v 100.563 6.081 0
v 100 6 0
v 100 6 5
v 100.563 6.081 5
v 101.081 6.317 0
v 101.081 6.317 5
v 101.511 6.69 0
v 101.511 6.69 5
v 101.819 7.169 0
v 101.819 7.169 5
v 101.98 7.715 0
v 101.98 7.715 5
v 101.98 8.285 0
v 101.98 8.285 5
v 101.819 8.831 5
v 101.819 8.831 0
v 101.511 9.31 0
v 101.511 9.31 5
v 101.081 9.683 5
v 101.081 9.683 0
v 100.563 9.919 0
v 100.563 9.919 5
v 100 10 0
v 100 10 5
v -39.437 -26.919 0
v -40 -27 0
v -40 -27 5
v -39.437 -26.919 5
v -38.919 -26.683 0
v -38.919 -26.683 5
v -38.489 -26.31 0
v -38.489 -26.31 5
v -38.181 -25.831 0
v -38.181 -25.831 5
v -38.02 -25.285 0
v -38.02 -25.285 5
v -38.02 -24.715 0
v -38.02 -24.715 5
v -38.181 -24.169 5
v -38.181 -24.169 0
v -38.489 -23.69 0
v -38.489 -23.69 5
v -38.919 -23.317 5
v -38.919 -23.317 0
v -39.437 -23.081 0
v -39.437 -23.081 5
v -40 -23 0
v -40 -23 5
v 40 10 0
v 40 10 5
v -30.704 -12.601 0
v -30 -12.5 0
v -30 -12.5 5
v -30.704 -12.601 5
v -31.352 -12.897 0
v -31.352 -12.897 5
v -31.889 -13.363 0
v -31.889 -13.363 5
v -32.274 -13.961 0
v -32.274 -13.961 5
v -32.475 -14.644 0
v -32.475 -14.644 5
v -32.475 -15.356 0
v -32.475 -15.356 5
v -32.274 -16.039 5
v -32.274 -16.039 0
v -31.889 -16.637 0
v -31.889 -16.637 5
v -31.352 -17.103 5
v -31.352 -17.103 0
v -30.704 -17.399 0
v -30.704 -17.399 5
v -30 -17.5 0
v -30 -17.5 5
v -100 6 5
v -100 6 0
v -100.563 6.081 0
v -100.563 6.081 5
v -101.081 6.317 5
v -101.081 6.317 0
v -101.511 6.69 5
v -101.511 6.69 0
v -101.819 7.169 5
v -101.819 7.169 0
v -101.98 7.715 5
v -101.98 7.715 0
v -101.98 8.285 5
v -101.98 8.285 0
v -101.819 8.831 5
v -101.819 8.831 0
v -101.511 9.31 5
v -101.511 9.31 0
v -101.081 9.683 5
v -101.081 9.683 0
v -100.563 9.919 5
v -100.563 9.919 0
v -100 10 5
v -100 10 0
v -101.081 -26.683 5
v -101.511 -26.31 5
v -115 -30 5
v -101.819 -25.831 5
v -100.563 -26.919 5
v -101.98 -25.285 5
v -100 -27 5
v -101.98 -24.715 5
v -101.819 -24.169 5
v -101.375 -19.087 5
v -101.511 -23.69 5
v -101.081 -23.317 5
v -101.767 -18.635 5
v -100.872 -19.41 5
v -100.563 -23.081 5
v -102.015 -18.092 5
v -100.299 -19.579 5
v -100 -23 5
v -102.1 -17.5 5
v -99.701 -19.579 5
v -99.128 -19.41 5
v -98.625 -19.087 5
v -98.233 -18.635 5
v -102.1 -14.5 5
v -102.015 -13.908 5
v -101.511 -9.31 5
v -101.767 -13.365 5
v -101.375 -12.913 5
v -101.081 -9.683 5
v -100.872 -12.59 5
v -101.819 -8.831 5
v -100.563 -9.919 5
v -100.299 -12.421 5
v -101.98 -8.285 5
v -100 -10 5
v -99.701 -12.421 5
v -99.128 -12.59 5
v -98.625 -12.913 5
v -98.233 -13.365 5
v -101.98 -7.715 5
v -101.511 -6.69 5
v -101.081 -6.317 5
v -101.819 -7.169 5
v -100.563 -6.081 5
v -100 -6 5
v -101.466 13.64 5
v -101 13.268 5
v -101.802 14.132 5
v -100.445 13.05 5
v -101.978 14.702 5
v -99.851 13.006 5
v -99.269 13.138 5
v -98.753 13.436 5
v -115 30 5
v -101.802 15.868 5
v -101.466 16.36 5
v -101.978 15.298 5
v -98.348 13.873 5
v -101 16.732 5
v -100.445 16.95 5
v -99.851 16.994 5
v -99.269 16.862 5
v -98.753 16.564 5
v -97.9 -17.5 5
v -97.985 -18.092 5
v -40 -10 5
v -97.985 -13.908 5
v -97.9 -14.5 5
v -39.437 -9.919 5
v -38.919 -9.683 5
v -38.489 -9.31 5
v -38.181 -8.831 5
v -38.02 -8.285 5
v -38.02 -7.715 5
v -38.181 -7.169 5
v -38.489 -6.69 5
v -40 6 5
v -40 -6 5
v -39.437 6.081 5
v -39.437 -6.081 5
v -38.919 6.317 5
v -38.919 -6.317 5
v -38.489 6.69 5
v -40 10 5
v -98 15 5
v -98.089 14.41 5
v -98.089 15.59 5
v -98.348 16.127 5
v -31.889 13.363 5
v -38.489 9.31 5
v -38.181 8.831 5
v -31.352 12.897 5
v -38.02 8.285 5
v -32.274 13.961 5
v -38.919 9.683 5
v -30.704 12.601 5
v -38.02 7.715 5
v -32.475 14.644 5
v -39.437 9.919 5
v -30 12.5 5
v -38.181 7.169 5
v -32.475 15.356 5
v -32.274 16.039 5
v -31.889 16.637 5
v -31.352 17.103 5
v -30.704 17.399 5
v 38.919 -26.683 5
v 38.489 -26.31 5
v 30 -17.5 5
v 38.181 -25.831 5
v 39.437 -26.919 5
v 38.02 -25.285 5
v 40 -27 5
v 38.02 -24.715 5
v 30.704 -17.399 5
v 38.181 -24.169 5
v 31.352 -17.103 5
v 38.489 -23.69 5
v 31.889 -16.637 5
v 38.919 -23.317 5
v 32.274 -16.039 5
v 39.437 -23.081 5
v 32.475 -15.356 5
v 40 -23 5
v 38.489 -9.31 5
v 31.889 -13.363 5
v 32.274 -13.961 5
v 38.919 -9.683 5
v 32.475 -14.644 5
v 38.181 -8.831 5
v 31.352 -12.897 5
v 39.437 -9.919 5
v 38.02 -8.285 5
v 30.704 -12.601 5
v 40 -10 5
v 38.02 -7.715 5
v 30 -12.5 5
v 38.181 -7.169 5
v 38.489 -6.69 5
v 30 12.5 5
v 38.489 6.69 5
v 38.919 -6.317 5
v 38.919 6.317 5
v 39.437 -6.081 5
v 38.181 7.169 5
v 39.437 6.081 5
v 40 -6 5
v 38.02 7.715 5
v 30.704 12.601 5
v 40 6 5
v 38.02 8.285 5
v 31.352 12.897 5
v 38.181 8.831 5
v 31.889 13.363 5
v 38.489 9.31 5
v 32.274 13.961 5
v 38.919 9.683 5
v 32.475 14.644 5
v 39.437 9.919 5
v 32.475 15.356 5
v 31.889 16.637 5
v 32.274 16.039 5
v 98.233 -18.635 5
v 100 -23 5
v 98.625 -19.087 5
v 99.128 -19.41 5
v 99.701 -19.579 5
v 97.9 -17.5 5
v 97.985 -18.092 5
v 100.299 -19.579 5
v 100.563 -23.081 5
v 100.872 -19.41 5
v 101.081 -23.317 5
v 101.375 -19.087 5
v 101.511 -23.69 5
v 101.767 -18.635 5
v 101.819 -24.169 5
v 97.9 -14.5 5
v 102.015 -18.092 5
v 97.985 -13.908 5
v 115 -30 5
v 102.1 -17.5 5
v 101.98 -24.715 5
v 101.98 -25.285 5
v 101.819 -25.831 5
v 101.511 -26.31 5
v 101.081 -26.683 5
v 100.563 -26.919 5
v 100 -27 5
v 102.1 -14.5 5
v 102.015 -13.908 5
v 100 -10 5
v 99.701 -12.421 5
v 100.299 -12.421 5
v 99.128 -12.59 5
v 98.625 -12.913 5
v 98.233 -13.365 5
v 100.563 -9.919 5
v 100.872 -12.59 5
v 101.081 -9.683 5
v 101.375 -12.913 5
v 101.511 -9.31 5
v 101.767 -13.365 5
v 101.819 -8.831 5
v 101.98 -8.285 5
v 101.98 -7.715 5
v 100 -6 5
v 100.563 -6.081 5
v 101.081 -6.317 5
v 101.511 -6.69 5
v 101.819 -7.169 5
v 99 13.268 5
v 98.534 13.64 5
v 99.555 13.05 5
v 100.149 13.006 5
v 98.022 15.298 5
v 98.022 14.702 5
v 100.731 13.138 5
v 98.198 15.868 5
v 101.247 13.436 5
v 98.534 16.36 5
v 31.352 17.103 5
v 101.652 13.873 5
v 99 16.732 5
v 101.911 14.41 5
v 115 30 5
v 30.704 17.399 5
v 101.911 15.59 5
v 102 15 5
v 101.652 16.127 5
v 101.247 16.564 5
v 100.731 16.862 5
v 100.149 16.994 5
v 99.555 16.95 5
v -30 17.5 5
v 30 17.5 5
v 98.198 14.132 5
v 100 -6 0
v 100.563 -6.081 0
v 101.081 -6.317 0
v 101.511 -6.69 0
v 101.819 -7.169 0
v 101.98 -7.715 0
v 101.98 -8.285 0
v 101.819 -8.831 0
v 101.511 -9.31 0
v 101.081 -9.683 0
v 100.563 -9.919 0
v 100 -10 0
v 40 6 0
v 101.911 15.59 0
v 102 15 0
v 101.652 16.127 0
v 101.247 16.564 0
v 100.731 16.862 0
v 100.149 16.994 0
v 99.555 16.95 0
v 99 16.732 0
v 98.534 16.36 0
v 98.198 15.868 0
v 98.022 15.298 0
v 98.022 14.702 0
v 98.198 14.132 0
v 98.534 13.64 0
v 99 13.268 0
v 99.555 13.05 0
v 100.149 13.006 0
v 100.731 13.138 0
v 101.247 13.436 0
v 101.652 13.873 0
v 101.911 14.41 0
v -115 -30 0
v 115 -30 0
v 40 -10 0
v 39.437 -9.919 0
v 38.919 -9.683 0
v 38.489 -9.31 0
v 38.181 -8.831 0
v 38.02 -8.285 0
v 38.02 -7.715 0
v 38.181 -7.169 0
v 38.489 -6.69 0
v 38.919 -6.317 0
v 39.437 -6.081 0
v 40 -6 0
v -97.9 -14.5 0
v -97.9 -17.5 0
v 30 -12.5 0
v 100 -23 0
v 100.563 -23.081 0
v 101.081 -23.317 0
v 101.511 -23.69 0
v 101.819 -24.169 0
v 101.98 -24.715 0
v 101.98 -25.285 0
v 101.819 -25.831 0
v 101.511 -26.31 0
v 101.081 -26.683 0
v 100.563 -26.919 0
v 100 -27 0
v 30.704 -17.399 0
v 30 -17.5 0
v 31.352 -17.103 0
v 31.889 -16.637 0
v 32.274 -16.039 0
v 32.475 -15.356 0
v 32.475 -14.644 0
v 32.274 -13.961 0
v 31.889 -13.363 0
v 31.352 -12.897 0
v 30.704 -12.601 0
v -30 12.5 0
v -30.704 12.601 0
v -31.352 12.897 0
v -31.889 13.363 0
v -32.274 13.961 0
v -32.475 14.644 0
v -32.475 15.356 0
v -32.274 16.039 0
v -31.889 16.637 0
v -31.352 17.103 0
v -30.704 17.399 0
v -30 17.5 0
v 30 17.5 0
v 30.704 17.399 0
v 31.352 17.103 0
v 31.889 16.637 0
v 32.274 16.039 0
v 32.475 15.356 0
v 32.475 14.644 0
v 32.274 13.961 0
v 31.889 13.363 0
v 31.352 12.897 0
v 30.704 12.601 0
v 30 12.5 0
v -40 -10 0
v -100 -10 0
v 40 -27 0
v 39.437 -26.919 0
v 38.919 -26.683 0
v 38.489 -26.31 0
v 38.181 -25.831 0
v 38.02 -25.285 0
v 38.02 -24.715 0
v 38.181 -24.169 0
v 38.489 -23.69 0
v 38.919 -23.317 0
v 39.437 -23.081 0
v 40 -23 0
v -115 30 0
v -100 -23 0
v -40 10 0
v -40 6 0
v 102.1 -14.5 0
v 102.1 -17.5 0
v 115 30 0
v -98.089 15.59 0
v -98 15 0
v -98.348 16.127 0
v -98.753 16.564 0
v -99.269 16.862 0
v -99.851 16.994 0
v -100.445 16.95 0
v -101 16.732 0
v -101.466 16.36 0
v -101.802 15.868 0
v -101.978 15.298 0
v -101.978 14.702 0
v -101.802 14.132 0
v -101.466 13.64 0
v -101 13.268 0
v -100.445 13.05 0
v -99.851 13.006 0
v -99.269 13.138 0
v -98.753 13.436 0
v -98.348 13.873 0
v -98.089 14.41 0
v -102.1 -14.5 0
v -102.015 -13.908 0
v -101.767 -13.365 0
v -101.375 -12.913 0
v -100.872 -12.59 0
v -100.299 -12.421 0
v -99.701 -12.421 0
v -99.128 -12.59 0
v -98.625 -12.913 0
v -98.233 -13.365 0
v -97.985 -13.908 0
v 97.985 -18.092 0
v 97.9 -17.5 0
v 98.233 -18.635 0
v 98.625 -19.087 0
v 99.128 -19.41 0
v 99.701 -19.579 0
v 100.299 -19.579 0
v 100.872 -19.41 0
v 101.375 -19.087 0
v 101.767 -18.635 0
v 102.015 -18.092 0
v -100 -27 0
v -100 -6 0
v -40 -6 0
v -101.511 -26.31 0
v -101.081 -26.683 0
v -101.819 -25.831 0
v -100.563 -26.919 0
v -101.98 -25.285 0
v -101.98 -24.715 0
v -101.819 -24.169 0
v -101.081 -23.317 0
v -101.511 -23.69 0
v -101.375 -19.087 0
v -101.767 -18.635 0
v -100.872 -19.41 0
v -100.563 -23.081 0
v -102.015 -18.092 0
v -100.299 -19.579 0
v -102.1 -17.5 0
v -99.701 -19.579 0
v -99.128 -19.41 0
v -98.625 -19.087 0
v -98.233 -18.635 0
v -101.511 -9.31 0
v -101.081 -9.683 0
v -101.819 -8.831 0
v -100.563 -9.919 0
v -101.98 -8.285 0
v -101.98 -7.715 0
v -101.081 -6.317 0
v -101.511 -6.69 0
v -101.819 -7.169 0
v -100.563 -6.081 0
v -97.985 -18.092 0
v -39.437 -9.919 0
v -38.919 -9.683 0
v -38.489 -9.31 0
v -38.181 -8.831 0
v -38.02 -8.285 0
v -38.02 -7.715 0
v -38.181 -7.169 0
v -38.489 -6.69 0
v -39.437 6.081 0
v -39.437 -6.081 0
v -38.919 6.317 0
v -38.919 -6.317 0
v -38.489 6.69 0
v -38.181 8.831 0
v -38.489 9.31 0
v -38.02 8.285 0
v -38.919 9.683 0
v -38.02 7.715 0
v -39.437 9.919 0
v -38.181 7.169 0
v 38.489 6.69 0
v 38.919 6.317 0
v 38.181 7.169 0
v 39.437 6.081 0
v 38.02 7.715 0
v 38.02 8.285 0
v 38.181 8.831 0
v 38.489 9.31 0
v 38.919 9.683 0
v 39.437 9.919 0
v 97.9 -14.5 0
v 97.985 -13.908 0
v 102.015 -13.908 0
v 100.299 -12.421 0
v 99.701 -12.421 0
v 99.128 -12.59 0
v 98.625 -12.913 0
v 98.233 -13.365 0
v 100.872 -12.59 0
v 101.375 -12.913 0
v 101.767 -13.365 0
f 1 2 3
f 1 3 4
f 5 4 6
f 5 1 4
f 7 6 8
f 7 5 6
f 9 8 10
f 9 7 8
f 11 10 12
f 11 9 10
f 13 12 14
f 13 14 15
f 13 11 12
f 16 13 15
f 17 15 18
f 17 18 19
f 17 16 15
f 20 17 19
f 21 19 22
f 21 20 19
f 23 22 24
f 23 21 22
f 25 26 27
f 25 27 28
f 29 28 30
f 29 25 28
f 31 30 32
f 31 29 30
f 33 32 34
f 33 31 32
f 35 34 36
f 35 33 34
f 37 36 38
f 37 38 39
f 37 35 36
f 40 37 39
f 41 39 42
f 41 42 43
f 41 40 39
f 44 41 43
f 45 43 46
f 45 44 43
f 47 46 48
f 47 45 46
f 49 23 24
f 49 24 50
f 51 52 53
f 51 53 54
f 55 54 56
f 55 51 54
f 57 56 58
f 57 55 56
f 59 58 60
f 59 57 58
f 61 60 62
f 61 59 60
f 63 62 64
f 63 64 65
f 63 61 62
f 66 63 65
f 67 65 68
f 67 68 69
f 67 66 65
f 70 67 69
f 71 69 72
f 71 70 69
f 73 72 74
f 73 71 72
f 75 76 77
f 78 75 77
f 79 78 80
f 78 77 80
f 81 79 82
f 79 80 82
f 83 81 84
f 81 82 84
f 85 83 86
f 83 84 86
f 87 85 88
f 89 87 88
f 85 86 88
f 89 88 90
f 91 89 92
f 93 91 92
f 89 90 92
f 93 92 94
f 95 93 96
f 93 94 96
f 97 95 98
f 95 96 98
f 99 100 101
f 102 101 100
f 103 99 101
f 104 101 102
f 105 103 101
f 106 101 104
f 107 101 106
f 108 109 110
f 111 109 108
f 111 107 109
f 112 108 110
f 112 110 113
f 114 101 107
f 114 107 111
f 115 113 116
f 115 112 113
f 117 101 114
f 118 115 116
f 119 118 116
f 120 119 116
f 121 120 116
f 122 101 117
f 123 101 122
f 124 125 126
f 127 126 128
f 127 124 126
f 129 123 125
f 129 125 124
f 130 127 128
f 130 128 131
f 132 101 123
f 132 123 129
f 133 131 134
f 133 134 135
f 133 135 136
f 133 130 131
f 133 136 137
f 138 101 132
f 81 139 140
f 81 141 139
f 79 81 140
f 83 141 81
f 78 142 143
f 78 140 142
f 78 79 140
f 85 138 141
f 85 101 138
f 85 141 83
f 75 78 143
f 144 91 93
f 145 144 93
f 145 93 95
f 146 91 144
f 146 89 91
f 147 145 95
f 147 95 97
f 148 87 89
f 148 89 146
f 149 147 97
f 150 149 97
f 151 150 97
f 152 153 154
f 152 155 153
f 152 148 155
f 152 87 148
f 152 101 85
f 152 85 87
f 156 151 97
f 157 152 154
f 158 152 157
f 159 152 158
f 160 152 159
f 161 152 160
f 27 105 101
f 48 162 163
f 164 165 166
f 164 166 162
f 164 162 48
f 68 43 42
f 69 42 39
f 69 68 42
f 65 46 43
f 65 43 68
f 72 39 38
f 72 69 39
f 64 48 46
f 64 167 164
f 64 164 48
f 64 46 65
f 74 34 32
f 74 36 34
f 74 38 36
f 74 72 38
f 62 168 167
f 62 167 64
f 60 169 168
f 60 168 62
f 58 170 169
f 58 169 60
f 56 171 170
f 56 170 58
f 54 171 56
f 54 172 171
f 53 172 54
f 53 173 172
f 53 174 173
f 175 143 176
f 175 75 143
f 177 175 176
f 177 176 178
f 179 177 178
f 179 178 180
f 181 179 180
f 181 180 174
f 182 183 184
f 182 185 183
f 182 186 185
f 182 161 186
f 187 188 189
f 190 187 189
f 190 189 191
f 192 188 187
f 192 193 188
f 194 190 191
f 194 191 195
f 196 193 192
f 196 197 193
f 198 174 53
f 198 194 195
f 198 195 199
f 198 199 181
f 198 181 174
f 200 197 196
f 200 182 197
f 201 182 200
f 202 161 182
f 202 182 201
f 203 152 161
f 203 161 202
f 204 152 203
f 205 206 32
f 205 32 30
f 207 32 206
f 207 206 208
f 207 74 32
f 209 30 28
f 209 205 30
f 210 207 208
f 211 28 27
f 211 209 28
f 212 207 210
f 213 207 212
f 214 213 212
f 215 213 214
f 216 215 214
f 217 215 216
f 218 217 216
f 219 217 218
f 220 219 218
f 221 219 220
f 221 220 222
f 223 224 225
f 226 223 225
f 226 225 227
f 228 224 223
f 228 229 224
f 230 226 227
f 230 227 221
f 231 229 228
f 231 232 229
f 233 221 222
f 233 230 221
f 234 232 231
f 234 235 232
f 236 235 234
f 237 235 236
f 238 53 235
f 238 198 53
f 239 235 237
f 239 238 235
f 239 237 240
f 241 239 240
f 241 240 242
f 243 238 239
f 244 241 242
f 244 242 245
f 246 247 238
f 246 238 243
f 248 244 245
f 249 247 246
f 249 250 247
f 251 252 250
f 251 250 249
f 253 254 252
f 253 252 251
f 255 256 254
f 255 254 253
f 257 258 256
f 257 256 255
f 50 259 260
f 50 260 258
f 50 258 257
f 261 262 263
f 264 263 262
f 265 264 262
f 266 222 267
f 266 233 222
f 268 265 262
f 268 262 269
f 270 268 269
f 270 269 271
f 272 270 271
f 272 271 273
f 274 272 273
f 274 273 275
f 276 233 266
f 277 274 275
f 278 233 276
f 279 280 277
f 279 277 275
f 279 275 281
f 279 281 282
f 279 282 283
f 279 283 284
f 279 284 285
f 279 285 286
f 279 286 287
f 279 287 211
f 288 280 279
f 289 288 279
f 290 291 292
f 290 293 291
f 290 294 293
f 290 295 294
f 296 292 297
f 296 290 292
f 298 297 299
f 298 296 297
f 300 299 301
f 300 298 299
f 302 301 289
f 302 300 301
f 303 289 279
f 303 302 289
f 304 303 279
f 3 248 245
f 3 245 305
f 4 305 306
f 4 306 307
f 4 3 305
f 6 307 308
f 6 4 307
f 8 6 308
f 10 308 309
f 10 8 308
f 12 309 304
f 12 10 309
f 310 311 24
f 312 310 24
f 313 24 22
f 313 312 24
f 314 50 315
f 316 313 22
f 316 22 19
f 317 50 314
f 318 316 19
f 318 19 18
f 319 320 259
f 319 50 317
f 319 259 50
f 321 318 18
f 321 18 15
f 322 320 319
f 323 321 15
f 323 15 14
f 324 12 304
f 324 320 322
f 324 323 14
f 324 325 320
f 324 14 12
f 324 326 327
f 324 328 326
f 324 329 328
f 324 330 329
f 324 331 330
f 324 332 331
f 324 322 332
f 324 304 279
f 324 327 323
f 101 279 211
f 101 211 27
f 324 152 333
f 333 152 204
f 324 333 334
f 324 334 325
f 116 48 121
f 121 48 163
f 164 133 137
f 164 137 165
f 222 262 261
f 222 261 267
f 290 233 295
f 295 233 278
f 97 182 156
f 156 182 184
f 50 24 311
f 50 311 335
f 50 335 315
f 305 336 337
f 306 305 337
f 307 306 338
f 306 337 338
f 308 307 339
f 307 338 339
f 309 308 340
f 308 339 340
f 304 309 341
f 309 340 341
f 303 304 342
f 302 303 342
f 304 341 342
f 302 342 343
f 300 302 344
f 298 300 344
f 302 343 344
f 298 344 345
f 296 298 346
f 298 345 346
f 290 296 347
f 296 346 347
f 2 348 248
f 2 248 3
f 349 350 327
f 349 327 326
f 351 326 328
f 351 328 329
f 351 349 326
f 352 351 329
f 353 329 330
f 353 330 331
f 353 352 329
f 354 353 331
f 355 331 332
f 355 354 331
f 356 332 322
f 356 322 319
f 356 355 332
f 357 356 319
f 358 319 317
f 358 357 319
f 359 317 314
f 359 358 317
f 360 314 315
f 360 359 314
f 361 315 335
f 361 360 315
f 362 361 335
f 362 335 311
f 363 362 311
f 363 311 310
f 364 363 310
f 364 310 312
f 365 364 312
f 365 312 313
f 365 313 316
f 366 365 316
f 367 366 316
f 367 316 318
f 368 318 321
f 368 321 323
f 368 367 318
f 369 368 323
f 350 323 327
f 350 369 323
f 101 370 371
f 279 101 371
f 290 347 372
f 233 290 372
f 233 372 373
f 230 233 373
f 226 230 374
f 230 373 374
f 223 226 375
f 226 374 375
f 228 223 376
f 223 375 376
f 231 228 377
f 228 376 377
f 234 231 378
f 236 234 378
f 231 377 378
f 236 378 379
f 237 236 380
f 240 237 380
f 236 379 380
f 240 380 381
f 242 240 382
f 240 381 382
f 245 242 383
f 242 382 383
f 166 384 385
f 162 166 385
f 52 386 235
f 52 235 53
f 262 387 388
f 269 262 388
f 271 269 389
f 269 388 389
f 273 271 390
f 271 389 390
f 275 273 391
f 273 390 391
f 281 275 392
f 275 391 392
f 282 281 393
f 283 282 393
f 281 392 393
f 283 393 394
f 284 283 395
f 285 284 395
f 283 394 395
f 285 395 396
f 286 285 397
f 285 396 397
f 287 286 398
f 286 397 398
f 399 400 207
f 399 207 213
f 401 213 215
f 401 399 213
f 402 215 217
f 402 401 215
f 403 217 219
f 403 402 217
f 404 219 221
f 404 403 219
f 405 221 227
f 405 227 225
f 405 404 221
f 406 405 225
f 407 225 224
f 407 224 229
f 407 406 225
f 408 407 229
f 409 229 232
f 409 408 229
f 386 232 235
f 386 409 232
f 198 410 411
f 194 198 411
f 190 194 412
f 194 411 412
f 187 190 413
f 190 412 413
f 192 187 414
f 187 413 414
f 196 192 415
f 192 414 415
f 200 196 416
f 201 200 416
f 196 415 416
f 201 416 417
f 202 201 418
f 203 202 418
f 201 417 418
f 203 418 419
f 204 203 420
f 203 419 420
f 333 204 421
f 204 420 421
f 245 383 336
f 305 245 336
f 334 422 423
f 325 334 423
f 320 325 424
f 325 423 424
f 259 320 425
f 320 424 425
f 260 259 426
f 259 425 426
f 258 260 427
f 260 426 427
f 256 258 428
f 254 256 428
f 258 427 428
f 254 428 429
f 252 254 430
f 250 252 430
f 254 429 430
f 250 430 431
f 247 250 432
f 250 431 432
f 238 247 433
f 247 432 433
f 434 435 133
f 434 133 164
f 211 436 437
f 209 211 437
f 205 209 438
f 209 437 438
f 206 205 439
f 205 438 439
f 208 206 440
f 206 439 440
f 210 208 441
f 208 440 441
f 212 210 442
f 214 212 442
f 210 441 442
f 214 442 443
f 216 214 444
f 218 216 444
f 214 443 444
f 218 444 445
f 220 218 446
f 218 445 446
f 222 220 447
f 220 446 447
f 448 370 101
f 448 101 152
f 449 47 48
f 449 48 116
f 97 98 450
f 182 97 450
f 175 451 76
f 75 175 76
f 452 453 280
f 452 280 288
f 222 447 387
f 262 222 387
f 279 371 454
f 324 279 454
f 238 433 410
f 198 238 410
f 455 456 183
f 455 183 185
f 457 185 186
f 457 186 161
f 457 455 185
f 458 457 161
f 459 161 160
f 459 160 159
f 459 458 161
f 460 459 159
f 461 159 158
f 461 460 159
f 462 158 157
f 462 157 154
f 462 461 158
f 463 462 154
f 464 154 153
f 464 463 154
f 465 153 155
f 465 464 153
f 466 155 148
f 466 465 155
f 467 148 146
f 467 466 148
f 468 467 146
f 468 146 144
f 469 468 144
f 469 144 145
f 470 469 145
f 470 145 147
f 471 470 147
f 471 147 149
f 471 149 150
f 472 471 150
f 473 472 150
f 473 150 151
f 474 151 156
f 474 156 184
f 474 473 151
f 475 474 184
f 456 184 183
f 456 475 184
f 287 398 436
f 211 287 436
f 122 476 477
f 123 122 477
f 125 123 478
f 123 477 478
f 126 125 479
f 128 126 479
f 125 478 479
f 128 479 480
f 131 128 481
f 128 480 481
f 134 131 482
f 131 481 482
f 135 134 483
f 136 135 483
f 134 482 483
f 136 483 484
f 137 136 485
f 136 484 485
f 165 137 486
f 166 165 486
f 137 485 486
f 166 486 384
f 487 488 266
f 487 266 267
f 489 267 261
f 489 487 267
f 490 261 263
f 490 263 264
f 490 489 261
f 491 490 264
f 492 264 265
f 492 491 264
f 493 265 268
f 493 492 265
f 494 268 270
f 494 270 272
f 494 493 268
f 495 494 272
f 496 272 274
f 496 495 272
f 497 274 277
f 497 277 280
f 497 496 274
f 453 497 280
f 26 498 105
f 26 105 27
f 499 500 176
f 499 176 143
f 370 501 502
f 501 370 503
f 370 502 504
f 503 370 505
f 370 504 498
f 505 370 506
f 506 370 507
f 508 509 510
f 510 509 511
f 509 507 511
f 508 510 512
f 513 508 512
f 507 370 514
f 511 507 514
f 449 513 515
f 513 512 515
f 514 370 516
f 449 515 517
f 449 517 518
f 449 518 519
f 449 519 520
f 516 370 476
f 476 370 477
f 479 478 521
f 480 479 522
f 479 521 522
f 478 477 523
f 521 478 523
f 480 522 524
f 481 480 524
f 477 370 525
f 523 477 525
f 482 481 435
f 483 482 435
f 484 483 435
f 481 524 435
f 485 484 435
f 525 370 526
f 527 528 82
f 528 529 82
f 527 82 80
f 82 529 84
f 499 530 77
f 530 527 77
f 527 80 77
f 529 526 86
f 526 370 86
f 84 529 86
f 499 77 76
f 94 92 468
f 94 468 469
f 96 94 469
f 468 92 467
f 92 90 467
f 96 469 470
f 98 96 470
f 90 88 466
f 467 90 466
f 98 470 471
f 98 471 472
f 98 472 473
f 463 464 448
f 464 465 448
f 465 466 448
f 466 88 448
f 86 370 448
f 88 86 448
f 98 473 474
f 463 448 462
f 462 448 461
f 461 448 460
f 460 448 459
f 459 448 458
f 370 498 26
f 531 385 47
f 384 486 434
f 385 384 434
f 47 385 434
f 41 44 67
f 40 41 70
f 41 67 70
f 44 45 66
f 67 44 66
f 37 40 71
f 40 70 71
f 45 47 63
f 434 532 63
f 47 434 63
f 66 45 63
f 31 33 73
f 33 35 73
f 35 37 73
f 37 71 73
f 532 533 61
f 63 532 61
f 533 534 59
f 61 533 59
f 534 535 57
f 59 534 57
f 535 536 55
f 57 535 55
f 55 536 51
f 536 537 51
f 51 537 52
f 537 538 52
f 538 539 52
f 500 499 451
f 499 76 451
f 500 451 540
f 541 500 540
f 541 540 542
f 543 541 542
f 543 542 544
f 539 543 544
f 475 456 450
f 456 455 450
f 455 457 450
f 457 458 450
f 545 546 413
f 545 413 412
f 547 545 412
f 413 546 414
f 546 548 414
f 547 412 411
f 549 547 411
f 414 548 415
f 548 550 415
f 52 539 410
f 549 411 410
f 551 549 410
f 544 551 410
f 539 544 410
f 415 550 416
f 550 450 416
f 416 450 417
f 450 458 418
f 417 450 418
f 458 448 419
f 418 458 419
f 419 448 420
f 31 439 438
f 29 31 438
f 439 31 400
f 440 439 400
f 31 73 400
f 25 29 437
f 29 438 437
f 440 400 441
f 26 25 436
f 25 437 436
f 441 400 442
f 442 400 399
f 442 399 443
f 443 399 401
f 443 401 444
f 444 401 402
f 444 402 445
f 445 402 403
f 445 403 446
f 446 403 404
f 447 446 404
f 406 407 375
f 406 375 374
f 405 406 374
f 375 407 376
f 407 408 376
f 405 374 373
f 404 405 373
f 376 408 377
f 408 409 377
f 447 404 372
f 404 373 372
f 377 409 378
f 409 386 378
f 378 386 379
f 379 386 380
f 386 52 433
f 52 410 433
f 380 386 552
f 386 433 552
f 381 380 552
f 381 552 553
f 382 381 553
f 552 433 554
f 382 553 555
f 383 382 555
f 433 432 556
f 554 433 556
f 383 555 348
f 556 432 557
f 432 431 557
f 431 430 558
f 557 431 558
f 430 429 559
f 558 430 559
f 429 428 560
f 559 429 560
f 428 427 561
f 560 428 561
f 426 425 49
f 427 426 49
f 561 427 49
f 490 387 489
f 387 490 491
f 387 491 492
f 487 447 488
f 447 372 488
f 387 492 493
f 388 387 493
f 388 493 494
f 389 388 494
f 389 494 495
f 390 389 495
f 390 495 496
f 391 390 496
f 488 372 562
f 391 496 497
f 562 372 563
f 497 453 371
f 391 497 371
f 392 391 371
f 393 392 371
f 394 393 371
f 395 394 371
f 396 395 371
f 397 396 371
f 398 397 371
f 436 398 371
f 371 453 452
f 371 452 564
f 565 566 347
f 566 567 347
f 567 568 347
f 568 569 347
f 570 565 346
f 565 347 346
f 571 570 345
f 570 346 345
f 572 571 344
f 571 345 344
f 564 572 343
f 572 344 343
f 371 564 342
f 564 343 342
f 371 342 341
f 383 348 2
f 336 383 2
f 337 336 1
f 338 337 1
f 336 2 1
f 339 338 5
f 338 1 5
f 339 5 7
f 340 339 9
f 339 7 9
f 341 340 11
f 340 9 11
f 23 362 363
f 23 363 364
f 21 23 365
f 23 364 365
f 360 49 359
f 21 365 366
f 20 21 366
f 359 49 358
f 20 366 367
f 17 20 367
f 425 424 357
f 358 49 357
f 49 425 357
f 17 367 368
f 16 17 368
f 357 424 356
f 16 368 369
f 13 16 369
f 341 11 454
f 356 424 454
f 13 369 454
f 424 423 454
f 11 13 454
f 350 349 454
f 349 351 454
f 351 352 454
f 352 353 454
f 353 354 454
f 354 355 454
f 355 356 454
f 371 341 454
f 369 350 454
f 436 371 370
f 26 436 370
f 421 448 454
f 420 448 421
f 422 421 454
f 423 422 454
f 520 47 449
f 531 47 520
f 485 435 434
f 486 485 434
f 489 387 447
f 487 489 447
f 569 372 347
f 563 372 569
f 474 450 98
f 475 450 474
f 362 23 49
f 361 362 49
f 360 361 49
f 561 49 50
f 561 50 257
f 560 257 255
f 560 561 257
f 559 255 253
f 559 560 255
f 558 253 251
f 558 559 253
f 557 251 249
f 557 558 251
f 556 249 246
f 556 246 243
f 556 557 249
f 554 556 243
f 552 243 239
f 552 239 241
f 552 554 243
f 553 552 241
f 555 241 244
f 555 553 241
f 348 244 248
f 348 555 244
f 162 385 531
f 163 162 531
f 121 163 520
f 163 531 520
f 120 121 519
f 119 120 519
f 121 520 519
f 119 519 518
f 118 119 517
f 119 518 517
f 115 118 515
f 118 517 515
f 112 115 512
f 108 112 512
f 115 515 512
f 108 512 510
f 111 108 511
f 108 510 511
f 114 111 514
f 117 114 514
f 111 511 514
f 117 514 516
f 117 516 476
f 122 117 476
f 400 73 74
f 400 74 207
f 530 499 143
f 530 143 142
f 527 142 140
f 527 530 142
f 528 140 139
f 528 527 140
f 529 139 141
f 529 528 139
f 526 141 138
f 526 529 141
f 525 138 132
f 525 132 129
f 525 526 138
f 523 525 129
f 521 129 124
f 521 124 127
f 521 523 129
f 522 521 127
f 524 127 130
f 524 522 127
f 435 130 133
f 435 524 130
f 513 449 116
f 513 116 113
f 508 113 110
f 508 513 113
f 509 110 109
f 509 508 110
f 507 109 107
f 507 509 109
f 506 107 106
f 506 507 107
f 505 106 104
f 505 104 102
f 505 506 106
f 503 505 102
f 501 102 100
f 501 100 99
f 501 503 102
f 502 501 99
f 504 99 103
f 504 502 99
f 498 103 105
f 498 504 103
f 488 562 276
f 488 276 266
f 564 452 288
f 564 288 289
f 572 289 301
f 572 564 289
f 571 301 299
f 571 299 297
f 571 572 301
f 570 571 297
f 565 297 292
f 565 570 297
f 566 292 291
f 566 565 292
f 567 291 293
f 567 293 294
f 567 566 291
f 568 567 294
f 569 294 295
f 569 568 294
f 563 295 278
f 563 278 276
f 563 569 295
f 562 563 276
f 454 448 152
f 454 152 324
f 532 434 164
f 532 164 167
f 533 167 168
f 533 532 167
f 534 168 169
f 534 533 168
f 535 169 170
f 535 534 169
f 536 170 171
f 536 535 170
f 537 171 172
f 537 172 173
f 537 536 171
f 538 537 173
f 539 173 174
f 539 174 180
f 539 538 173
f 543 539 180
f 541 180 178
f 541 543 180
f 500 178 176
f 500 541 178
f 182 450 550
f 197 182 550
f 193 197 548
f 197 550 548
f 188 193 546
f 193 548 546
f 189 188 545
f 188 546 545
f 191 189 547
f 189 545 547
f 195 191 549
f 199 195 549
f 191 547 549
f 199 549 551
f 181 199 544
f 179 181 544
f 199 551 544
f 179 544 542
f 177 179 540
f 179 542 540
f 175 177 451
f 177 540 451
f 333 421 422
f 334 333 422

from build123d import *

# Parameters (mm, degrees)
SKETCH_2_W      = 230
SKETCH_2_H      = 60
SKETCH_2_R      = 2
EXTRUDE_1_DEPTH = 5


with BuildPart() as part:
    # 草图2 → 凸台-拉伸1 (new body)
    with BuildSketch(Plane.XY):
        Rectangle(SKETCH_2_W, SKETCH_2_H)
        with Locations((-100, 15)):
            Circle(SKETCH_2_R, mode=Mode.SUBTRACT)
        with Locations((100, 15)):
            Circle(SKETCH_2_R, mode=Mode.SUBTRACT)
        with BuildLine():
            Line((-30, 17.5), (30, 17.5))
            ThreePointArc((30, 17.5), (32.5, 15), (30, 12.5))
            Line((30, 12.5), (-30, 12.5))
            ThreePointArc((-30, 12.5), (-32.5, 15), (-30, 17.5))
        make_face(mode=Mode.SUBTRACT)
        with BuildLine():
            Line((40, -23), (100, -23))
            ThreePointArc((100, -23), (102, -25), (100, -27))
            Line((100, -27), (40, -27))
            ThreePointArc((40, -27), (38, -25), (40, -23))
        make_face(mode=Mode.SUBTRACT)
        with BuildLine():
            Line((-100, 10), (-40, 10))
            ThreePointArc((-40, 10), (-38, 8), (-40, 6))
            Line((-40, 6), (-100, 6))
            ThreePointArc((-100, 6), (-102, 8), (-100, 10))
        make_face(mode=Mode.SUBTRACT)
        with BuildLine():
            Line((-100, -10), (-40, -10))
            ThreePointArc((-40, -10), (-38, -8), (-40, -6))
            Line((-40, -6), (-100, -6))
            ThreePointArc((-100, -6), (-102, -8), (-100, -10))
        make_face(mode=Mode.SUBTRACT)
        with BuildLine():
            Line((100, -10), (40, -10))
            ThreePointArc((40, -10), (38, -8), (40, -6))
            Line((40, -6), (100, -6))
            ThreePointArc((100, -6), (102, -8), (100, -10))
        make_face(mode=Mode.SUBTRACT)
        with BuildLine():
            Line((100, 10), (40, 10))
            ThreePointArc((40, 10), (38, 8), (40, 6))
            Line((40, 6), (100, 6))
            ThreePointArc((100, 6), (102, 8), (100, 10))
        make_face(mode=Mode.SUBTRACT)
        with BuildLine():
            Line((-102.1, -17.5), (-102.1, -14.5))
            ThreePointArc((-102.1, -14.5), (-100, -12.4), (-97.9, -14.5))
            Line((-97.9, -14.5), (-97.9, -17.5))
            ThreePointArc((-97.9, -17.5), (-100, -19.6), (-102.1, -17.5))
        make_face(mode=Mode.SUBTRACT)
        with BuildLine():
            Line((102.1, -17.5), (102.1, -14.5))
            ThreePointArc((102.1, -14.5), (100, -12.4), (97.9, -14.5))
            Line((97.9, -14.5), (97.9, -17.5))
            ThreePointArc((97.9, -17.5), (100, -19.6), (102.1, -17.5))
        make_face(mode=Mode.SUBTRACT)
        with BuildLine():
            Line((-30, -17.5), (30, -17.5))
            ThreePointArc((30, -17.5), (32.5, -15), (30, -12.5))
            Line((30, -12.5), (-30, -12.5))
            ThreePointArc((-30, -12.5), (-32.5, -15), (-30, -17.5))
        make_face(mode=Mode.SUBTRACT)
        with BuildLine():
            Line((-40, -23), (-100, -23))
            ThreePointArc((-100, -23), (-102, -25), (-100, -27))
            Line((-100, -27), (-40, -27))
            ThreePointArc((-40, -27), (-38, -25), (-40, -23))
        make_face(mode=Mode.SUBTRACT)
    extrude(amount=EXTRUDE_1_DEPTH)


solid = part.part
